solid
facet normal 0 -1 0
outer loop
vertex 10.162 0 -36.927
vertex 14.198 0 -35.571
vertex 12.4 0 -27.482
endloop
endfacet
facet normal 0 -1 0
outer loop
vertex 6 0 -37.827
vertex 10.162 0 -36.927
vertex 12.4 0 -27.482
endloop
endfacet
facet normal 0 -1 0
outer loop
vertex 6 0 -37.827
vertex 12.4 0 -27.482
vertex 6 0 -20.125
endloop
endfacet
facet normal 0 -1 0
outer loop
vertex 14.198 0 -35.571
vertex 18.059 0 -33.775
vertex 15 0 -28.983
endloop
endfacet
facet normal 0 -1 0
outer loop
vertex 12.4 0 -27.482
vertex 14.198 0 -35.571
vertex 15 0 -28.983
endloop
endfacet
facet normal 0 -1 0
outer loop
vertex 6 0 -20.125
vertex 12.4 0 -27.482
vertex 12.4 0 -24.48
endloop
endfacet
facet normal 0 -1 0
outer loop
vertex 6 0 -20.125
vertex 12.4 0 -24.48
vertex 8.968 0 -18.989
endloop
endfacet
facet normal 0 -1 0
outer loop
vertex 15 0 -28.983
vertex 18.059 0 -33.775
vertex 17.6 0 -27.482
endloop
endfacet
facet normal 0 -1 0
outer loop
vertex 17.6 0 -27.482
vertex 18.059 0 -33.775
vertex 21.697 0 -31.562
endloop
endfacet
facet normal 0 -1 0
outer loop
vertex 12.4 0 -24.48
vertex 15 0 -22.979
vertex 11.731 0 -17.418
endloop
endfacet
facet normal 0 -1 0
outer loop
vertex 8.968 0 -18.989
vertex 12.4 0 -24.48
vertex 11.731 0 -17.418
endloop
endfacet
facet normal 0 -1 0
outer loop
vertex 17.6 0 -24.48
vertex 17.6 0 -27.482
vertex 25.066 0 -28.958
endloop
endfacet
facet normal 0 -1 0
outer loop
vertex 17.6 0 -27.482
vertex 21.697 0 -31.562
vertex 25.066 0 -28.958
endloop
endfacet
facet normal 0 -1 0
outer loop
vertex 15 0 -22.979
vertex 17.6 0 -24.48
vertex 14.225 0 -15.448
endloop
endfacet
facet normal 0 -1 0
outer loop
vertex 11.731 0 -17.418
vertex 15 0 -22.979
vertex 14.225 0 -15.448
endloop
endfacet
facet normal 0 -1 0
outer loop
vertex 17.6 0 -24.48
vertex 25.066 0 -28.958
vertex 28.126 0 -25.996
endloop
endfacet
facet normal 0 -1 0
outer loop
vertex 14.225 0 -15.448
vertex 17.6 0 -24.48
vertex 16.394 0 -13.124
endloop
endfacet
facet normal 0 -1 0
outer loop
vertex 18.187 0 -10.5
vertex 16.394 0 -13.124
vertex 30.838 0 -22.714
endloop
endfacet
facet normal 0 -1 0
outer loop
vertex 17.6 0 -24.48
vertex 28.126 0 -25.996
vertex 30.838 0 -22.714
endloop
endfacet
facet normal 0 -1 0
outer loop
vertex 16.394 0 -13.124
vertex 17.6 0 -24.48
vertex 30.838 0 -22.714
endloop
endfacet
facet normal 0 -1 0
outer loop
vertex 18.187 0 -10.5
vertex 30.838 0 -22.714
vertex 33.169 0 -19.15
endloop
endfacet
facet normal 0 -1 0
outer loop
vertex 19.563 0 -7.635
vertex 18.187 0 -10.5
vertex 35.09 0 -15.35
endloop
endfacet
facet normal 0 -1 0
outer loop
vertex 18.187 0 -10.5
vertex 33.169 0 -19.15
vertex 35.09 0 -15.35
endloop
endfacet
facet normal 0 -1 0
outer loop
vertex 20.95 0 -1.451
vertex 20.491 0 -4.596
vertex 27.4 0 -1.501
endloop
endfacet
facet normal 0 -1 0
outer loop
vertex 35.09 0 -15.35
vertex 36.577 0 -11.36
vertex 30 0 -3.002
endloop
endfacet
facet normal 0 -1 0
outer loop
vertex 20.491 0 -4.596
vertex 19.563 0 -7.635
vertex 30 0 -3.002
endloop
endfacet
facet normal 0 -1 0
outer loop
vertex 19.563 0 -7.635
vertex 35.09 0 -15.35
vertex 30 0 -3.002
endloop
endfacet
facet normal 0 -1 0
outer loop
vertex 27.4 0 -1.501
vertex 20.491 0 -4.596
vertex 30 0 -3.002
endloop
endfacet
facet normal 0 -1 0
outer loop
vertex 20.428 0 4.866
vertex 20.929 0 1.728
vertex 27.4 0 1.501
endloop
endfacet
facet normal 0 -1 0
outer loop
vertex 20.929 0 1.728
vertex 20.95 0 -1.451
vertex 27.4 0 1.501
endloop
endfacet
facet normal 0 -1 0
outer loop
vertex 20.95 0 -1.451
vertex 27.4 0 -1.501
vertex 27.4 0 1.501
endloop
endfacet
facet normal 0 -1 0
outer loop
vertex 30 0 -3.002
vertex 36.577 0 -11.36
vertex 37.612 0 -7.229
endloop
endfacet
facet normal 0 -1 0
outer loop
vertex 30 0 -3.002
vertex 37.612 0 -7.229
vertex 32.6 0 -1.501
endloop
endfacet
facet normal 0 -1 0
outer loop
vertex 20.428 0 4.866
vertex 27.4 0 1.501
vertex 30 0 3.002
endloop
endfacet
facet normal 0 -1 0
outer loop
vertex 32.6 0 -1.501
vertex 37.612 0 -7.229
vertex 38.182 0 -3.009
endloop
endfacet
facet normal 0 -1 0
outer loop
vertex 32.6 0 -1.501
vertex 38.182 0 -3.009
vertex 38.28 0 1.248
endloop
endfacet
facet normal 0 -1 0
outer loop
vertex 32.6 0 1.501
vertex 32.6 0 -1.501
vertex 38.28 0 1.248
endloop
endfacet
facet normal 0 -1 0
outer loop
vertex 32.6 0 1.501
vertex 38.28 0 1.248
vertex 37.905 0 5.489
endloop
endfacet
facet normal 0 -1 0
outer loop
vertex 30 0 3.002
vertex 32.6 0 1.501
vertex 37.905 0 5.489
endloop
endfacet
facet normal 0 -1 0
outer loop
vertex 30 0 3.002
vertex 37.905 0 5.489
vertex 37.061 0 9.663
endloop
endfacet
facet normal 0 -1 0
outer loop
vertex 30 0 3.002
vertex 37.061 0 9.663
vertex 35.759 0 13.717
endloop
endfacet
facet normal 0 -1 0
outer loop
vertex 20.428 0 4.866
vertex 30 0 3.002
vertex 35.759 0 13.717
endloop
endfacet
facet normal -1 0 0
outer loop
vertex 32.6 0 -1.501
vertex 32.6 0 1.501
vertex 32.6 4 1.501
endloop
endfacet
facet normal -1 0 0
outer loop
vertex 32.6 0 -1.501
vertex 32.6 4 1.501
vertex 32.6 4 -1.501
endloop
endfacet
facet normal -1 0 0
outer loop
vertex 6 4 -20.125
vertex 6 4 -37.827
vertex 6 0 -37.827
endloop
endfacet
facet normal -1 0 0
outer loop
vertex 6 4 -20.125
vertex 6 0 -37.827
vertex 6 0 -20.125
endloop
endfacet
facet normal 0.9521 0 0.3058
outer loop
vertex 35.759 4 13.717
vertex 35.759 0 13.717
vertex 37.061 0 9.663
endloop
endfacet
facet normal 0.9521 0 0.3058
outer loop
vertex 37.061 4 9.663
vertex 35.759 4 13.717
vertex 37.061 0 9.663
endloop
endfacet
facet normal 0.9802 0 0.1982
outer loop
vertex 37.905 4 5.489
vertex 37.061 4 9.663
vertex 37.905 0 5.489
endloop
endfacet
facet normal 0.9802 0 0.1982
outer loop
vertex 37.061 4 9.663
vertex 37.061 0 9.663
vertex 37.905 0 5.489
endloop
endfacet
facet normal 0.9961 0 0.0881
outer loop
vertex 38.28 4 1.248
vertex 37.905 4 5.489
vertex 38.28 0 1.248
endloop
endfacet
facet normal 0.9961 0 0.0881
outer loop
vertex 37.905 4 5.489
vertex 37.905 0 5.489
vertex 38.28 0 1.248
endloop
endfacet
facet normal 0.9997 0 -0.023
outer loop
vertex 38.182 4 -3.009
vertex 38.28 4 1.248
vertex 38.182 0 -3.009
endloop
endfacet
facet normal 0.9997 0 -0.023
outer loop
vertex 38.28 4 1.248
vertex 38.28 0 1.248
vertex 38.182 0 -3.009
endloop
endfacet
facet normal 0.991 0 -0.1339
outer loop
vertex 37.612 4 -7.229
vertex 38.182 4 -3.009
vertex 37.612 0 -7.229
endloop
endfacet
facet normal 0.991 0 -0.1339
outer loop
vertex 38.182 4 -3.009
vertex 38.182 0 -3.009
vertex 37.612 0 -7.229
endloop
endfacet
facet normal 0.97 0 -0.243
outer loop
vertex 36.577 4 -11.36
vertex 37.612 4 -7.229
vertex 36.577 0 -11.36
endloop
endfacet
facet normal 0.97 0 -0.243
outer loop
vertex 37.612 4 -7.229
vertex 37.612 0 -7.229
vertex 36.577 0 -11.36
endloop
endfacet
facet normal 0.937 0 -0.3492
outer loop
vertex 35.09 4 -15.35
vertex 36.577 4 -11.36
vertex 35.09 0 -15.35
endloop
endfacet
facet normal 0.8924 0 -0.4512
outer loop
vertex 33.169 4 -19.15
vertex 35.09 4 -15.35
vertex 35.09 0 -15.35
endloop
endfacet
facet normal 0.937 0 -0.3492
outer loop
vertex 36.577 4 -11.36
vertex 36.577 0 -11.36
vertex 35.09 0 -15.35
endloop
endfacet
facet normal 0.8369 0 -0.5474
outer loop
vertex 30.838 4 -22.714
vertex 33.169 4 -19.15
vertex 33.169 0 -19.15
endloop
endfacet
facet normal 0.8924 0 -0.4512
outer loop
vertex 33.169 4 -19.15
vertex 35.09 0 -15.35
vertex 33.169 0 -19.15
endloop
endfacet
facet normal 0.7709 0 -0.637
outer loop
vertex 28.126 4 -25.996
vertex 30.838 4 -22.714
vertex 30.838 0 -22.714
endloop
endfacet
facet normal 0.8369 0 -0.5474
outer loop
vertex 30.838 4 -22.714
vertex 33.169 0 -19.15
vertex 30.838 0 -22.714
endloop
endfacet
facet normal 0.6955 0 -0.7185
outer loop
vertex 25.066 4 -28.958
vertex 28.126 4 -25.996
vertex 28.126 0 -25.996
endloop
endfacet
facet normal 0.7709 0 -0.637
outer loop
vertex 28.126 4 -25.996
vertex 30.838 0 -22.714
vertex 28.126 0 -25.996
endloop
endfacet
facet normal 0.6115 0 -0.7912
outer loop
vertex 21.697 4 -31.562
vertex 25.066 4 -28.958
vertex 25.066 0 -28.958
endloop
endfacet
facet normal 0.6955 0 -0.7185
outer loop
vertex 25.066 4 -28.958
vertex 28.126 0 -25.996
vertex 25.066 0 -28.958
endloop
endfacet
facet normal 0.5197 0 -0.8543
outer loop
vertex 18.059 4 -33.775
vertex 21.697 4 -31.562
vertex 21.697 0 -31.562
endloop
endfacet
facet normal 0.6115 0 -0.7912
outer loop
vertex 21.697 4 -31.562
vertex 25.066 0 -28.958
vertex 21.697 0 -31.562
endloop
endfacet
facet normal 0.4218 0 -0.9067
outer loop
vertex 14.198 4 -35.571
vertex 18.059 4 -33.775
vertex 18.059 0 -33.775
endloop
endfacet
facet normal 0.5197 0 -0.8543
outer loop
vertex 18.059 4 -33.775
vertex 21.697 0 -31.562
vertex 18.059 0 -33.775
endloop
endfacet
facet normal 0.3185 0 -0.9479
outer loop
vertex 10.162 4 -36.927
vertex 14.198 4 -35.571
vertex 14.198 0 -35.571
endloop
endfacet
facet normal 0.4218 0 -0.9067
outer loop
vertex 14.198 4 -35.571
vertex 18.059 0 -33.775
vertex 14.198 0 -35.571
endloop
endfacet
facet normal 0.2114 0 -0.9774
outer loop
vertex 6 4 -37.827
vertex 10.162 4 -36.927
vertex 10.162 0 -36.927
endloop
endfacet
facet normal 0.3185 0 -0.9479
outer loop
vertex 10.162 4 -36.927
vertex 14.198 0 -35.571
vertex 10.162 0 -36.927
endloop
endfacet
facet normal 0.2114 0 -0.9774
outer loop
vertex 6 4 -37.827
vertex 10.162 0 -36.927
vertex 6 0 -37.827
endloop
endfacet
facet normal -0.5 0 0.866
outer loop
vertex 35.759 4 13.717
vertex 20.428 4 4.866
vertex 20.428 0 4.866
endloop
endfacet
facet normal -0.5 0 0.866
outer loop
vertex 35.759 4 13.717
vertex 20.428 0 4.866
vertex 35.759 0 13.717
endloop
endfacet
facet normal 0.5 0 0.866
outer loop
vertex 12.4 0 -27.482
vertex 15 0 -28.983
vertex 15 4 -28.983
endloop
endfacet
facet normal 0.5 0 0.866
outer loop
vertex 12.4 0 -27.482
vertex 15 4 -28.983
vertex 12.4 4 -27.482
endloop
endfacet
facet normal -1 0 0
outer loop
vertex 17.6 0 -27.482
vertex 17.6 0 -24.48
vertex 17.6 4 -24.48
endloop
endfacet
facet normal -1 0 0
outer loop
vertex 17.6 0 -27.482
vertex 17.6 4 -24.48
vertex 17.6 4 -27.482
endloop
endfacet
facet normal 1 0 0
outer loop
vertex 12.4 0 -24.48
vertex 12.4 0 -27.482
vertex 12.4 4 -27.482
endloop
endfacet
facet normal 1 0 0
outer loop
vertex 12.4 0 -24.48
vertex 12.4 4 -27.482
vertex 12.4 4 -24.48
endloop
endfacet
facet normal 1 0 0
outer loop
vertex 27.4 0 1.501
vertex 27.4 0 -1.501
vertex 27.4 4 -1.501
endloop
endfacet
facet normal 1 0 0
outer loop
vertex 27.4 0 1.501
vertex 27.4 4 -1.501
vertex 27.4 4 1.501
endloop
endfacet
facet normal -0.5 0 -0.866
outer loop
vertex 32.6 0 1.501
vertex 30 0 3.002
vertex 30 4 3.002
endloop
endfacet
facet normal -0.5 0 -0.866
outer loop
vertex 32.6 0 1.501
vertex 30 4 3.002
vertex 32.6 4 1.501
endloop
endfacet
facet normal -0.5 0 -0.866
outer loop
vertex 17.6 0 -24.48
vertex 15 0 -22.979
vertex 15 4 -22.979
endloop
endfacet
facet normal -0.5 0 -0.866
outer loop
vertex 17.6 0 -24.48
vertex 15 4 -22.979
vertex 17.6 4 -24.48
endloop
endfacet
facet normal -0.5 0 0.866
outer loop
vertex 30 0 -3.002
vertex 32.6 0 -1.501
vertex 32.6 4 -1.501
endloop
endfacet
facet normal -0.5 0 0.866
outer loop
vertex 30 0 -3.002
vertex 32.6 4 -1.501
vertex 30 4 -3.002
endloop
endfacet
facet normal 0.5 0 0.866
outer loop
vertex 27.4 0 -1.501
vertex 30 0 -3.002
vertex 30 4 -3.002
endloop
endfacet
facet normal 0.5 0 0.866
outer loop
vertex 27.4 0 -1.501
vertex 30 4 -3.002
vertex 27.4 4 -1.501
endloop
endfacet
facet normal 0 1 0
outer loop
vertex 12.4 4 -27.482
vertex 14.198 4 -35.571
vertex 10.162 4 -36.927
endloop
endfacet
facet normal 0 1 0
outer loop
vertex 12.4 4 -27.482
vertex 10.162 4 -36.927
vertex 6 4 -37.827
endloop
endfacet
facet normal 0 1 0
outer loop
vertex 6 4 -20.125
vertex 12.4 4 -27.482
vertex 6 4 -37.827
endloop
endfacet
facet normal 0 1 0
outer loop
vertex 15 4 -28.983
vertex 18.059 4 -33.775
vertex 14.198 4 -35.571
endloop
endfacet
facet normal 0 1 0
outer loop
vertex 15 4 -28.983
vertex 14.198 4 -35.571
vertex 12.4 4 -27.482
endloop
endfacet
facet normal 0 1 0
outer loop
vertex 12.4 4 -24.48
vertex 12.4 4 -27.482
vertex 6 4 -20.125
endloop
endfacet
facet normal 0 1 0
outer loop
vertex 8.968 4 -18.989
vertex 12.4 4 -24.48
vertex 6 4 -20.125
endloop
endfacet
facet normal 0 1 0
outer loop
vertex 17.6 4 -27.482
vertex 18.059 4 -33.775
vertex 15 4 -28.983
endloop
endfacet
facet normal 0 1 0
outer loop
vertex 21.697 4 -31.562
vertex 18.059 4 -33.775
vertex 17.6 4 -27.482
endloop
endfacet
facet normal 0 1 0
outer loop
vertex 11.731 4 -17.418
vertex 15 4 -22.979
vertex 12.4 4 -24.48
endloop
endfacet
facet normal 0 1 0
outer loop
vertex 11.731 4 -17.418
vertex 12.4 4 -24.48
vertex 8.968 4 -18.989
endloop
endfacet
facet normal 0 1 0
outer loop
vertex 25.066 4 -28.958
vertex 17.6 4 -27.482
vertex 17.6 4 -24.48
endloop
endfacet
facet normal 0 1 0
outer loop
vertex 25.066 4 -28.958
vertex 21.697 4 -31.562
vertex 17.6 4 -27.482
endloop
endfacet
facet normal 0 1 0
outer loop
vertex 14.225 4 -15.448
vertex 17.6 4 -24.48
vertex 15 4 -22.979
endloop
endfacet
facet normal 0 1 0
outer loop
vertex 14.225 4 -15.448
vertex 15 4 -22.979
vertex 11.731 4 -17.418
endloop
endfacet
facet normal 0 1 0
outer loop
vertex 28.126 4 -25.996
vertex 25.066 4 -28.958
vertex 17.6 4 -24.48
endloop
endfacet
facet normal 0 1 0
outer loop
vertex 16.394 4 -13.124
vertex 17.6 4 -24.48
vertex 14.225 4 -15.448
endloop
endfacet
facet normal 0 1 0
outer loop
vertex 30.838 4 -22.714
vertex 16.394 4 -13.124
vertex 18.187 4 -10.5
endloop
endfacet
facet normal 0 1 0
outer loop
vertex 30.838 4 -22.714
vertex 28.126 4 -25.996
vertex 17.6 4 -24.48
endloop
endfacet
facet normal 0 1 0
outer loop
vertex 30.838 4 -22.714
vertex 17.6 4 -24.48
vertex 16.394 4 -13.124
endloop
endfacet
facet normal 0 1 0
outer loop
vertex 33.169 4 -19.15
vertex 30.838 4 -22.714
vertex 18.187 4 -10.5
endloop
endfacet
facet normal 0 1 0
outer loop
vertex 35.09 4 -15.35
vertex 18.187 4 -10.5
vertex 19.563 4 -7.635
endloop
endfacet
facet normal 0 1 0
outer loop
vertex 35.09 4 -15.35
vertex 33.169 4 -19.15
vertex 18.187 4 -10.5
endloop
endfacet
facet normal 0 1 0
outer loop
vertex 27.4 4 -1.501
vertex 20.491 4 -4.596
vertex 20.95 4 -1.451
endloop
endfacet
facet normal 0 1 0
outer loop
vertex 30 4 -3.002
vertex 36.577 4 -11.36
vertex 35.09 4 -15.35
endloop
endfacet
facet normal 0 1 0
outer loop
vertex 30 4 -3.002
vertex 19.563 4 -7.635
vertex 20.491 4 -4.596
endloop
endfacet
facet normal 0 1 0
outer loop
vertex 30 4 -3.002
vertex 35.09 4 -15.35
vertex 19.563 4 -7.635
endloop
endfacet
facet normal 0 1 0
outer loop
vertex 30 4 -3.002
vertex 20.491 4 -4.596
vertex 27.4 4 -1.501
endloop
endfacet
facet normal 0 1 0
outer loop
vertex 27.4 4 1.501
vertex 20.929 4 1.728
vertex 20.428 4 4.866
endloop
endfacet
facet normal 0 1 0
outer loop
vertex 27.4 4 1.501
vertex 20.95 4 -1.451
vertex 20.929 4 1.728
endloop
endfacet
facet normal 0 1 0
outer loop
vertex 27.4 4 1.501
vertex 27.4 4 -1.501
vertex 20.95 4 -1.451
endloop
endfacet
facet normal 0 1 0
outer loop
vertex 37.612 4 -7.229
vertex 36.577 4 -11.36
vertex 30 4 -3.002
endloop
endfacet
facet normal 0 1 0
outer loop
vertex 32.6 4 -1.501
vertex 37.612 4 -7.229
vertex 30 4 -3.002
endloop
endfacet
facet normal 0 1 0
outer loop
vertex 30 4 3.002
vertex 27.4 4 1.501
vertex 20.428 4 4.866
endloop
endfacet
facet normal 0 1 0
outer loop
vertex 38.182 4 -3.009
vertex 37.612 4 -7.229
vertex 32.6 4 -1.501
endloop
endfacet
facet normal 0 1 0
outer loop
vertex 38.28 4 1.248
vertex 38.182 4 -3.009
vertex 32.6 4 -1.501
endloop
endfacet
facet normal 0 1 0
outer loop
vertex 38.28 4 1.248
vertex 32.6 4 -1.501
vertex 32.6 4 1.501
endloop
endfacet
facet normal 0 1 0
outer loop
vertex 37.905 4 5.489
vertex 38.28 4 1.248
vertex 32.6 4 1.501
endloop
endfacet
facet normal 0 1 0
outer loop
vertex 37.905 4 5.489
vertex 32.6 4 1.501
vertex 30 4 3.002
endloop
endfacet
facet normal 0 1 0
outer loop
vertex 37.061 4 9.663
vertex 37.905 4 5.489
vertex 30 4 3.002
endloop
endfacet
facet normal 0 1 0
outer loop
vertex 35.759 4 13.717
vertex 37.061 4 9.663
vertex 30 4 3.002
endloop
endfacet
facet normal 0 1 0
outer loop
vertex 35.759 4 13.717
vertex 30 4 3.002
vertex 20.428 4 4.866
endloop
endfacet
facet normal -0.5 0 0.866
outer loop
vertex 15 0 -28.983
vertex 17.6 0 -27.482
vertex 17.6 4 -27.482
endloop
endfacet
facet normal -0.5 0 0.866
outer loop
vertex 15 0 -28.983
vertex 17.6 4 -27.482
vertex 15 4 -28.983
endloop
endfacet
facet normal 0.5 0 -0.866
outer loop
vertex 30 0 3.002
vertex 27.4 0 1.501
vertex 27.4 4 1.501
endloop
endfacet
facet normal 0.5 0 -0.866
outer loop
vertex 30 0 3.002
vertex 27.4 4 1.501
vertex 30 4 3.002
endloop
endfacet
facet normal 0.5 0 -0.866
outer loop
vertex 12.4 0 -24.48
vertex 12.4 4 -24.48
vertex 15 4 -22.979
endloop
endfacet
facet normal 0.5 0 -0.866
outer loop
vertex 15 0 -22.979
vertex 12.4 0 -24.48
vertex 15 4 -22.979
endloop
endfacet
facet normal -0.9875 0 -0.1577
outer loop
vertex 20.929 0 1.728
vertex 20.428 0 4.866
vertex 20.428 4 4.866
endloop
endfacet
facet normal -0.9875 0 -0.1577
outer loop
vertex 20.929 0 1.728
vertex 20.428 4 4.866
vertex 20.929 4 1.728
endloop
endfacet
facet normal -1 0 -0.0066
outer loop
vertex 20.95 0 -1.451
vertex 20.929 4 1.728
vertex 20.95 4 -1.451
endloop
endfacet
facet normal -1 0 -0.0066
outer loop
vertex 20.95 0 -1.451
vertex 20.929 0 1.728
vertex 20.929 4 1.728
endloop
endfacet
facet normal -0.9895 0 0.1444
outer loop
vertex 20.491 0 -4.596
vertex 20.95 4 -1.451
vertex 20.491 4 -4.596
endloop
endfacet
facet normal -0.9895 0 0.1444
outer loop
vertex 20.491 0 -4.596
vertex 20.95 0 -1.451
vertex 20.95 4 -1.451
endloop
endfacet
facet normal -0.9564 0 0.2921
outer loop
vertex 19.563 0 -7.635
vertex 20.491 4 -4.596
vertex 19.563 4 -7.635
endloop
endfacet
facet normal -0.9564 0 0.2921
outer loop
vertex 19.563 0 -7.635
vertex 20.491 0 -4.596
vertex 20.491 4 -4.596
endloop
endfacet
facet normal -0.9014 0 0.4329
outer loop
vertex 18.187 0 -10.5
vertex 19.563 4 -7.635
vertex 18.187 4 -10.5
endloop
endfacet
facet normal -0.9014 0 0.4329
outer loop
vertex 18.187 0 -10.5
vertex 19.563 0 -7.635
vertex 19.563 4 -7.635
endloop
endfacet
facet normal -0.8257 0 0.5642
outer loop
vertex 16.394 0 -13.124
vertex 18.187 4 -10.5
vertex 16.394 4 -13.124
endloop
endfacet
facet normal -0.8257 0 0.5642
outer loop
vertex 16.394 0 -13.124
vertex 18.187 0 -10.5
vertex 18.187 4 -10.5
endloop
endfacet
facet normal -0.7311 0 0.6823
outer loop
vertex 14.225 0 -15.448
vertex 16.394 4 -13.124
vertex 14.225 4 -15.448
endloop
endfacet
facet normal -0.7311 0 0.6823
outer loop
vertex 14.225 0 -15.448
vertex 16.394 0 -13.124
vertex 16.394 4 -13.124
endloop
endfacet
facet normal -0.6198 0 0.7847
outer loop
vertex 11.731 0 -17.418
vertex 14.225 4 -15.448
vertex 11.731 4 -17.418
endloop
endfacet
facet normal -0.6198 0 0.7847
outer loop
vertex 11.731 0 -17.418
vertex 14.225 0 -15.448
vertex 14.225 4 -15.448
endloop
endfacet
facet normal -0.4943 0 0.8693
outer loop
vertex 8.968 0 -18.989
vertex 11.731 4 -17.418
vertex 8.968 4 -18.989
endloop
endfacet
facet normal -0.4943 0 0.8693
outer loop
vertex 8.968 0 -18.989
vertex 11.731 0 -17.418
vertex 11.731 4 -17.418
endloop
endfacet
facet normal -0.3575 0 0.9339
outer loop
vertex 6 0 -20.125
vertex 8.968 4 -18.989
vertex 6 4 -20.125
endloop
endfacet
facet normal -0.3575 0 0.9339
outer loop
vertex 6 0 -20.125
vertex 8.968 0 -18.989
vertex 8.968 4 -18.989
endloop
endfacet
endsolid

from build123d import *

# Parameters (mm, degrees)
SKETCH1_R           = 38.3
SKETCH1_R_2         = 21
BOSS_EXTRUDE1_DEPTH = 4
CUT_EXTRUDE1_DEPTH  = 10


with BuildPart() as part:
    # Sketch1 → Boss-Extrude1 (new body)
    with BuildSketch(Plane(origin=(0, 0, 0), x_dir=(1, 0, 0), z_dir=(0, 1, 0))):
        with Locations(Location((0, 0, 0), (0, 0, 270))):
            Circle(SKETCH1_R)
        with Locations(Location((0, 0, 0), (0, 0, 270))):
            Circle(SKETCH1_R_2, mode=Mode.SUBTRACT)
        Polygon((12.4, -27.481872813), (15, -28.982983513), (17.6, -27.481872813), (17.6, -24.479651414), (15, -22.978540714), (12.4, -24.479651414), align=None, mode=Mode.SUBTRACT)
        Polygon((30, 3.0022214), (27.4, 1.5011107), (27.4, -1.5011107), (30, -3.0022214), (32.6, -1.5011107), (32.6, 1.5011107), align=None, mode=Mode.SUBTRACT)
        Polygon((-17.6, -24.479651414), (-17.6, -27.481872813), (-15, -28.982983513), (-12.4, -27.481872813), (-12.4, -24.479651414), (-15, -22.978540714), align=None, mode=Mode.SUBTRACT)
        Polygon((-30, 3.0022214), (-32.6, 1.5011107), (-32.6, -1.5011107), (-30, -3.0022214), (-27.4, -1.5011107), (-27.4, 1.5011107), align=None, mode=Mode.SUBTRACT)
        Polygon((-12.4, 27.481872813), (-15, 28.982983513), (-17.6, 27.481872813), (-17.6, 24.479651414), (-15, 22.978540714), (-12.4, 24.479651414), align=None, mode=Mode.SUBTRACT)
        Polygon((17.6, 24.479651414), (17.6, 27.481872813), (15, 28.982983513), (12.4, 27.481872813), (12.4, 24.479651414), (15, 22.978540714), align=None, mode=Mode.SUBTRACT)
    extrude(amount=BOSS_EXTRUDE1_DEPTH)

    # Sketch2 → Cut-Extrude1 (cut)
    with BuildSketch(Plane(origin=(0, 4, 0), x_dir=(1, 0, 0), z_dir=(0, 1, 0))):
        with BuildLine():
            Line((6, 50.276302336), (6, 14.297506921))
            ThreePointArc((6, 14.297506921), (13.428105902, 7.752720557), (15.382004204, -1.952601038))
            Line((15.382004204, -1.952601038), (46.540555031, -19.941998745))
            ThreePointArc((46.540555031, -19.941998745), (-43.84951462, -25.31652907), (6, 50.276302336))
        make_face()
    extrude(amount=-CUT_EXTRUDE1_DEPTH, mode=Mode.SUBTRACT)


solid = part.part
